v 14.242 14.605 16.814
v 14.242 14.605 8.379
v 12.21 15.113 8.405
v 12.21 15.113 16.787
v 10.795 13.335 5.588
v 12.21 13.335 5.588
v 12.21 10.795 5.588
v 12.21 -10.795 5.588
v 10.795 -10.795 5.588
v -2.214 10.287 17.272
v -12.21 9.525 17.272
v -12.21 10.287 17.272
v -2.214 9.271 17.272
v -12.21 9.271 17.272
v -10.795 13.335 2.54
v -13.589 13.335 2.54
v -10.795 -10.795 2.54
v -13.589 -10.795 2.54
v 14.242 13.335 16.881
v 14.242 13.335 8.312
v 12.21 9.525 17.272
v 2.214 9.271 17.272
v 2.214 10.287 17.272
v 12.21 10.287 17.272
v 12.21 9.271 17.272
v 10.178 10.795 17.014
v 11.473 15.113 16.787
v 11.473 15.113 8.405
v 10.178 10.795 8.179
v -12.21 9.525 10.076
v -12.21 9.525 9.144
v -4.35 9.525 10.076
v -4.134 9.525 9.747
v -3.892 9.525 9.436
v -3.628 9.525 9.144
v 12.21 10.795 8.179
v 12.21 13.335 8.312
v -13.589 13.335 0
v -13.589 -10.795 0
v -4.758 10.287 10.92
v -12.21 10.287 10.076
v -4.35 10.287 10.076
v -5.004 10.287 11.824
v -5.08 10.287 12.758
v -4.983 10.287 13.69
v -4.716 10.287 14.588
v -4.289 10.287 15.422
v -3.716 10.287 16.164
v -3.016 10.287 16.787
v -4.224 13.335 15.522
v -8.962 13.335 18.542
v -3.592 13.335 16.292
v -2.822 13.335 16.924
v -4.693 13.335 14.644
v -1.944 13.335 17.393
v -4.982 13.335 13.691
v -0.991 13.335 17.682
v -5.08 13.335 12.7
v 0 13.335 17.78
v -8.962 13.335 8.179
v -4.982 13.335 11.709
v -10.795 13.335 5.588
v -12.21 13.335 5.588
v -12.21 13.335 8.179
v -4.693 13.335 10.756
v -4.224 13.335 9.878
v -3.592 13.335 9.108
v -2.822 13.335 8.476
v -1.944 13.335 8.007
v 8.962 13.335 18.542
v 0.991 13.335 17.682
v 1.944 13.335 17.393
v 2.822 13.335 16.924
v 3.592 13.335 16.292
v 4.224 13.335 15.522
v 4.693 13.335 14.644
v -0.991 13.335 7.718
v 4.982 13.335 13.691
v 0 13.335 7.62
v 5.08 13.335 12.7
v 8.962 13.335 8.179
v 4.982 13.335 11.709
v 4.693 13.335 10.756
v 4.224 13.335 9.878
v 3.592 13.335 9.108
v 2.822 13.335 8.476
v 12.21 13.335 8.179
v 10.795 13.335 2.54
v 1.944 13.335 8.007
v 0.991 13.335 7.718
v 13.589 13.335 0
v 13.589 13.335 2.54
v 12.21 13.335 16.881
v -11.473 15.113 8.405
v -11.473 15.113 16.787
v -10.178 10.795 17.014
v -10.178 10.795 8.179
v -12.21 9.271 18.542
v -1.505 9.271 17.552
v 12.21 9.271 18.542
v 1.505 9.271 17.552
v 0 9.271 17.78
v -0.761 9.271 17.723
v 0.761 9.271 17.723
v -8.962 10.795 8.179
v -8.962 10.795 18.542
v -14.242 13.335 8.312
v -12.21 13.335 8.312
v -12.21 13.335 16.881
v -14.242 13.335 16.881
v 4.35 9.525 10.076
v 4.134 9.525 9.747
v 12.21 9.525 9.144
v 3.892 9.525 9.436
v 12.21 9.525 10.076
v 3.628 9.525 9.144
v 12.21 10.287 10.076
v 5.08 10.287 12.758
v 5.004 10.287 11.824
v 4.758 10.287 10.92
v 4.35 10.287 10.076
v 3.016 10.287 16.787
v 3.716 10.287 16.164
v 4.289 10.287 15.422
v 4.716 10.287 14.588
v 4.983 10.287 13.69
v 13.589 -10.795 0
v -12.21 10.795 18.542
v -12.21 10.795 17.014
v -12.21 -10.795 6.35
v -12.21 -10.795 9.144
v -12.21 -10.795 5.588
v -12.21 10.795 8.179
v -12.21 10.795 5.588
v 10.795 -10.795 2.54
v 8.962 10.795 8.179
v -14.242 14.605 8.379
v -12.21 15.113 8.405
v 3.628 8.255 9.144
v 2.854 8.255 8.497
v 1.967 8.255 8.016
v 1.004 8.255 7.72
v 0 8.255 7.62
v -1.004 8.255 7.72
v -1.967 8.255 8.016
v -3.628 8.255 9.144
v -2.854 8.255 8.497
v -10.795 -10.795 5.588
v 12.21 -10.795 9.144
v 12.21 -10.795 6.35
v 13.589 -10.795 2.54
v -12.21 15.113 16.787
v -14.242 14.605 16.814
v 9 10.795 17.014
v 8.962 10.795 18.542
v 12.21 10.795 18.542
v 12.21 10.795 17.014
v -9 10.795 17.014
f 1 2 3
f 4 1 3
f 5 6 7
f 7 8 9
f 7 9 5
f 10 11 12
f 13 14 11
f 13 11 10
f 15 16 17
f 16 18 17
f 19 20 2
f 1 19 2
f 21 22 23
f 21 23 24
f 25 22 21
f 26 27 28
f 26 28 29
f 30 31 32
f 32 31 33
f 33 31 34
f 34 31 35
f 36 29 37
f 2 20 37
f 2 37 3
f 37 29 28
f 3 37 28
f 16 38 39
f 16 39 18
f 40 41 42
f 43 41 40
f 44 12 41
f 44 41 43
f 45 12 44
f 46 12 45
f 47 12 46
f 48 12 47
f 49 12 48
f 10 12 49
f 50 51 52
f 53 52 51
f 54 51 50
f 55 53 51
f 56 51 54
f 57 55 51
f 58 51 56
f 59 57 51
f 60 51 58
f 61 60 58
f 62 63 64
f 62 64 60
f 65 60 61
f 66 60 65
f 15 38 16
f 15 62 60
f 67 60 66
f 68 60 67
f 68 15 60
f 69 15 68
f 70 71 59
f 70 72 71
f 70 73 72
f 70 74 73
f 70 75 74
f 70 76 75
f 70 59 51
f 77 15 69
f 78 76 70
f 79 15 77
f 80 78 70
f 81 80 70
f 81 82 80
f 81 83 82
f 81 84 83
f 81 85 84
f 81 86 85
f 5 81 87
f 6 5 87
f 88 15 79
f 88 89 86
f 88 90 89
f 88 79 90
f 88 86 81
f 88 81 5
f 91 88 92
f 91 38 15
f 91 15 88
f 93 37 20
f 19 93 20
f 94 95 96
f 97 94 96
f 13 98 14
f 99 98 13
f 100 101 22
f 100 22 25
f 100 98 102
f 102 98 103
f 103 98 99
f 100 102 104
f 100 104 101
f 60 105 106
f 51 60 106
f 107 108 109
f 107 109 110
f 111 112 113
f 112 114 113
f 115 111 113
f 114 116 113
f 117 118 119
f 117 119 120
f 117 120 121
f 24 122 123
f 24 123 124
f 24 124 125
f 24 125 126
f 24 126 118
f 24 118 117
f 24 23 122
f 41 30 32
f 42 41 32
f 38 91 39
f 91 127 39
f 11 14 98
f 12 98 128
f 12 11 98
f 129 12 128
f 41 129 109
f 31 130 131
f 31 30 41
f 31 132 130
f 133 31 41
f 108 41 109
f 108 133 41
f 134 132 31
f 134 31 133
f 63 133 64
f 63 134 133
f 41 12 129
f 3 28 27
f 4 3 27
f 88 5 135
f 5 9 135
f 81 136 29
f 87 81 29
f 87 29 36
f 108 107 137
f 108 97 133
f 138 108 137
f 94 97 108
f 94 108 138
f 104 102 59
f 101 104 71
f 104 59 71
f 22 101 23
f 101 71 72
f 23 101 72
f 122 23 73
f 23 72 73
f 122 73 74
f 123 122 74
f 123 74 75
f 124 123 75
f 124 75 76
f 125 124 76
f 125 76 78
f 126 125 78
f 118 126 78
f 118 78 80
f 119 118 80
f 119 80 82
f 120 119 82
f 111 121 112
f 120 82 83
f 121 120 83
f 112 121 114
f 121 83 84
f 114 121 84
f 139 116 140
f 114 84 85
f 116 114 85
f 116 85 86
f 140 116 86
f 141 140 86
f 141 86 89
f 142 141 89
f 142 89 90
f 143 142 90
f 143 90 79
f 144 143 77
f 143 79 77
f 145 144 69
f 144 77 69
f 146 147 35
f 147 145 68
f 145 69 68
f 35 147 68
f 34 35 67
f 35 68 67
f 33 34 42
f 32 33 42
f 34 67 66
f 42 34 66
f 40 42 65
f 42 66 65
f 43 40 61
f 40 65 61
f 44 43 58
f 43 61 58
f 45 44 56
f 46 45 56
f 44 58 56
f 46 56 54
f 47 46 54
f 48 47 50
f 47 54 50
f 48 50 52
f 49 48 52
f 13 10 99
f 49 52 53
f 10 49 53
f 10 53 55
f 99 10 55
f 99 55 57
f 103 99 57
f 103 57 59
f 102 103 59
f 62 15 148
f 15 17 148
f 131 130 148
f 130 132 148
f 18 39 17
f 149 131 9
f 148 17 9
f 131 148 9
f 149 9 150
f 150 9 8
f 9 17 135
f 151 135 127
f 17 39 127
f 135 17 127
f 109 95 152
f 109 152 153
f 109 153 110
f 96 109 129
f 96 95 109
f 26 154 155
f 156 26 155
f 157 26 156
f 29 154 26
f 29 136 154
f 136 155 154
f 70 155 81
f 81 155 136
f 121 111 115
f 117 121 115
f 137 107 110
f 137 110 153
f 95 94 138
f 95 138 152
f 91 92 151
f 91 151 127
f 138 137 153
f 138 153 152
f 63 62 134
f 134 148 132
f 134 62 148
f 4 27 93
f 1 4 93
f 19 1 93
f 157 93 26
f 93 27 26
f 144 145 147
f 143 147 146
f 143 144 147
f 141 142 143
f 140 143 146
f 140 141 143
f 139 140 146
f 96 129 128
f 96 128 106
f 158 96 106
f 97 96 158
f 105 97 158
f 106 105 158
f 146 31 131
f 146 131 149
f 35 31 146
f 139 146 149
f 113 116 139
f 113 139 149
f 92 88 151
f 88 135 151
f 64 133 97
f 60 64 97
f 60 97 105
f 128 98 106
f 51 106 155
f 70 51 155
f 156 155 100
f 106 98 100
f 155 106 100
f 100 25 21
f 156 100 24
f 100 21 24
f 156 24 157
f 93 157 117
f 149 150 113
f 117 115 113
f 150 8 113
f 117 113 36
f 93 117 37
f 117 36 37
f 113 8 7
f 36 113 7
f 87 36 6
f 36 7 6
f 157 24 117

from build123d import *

# Parameters (mm, degrees)
SKETCH2_W                       = 27.178
SKETCH2_H                       = 21.59
INITIAL_EXTRUDE_DEPTH           = 6.35
SKETCH3_W                       = 27.178
SKETCH3_H                       = 1.27
INTIAL_EXTRUDE_HORIZONTAL_DEPTH = 12.192
SKETCH4_W                       = 27.178
SKETCH4_H                       = 1.27
SLIGHT_EXTRUDE_VERTICAL_DEPTH   = 0.254
SKETCH5_W                       = 3.048
SKETCH5_H                       = 21.59
CUT_EXTRUDE1_DEPTH              = 2.794
CUT_EXTRUDE2_REACH              = 33.537
SKETCH6_W                       = 1.379153921
SKETCH6_H                       = 12.954
SNAP_START                      = 11.473246079
SNAP_HOOK2_DEPTH                = 0.7366
SNAP_START_2                    = 8.31223189
SNAP_HOOK2_2_DEPTH              = 8.568362063
SNAP_START_3                    = 8.179116131
SNAP_HOOK2_3_DEPTH              = 8.834593581
SNAP_START_4                    = 9
SNAP_HOOK2_4_DEPTH              = 6
BOSS_EXTRUDE1_DEPTH             = 2.54
SKETCH8_W                       = 24.419692158
SKETCH8_H                       = 7.195933706
CUT_EXTRUDE3_DEPTH              = 0.762
SKETCH9_W                       = 24.419692158
SKETCH9_H                       = 20.32
BOSS_EXTRUDE2_DEPTH             = 2.794
SKETCH10_R                      = 5.08
CUT_EXTRUDE4_DEPTH              = 5.08


with BuildPart() as part:
    # Sketch2 → Initial Extrude (new body)
    with BuildSketch(Plane.XY):
        Rectangle(SKETCH2_W, SKETCH2_H)
    extrude(amount=INITIAL_EXTRUDE_DEPTH)

    # Sketch3 → Intial Extrude horizontal (add)
    with BuildSketch(Plane.XY.offset(6.35)):
        with Locations((0, 10.16)):
            Rectangle(SKETCH3_W, SKETCH3_H)
    extrude(amount=INTIAL_EXTRUDE_HORIZONTAL_DEPTH)

    # Sketch4 → Slight Extrude vertical (add)
    with BuildSketch(Plane.XZ.offset(-9.525)):
        with Locations((0, 17.907)):
            Rectangle(SKETCH4_W, SKETCH4_H)
    extrude(amount=SLIGHT_EXTRUDE_VERTICAL_DEPTH)

    # Sketch5 → Cut-Extrude1 (cut)
    with BuildSketch(Plane.ZY.offset(13.589)):
        with Locations((4.064, 0)):
            Rectangle(SKETCH5_W, SKETCH5_H)
    cut_extrude1 = extrude(amount=-CUT_EXTRUDE1_DEPTH, mode=Mode.SUBTRACT)

    # Mirror3: Cut-Extrude1 across plane
    add(cut_extrude1.mirror(Plane(origin=(0, 0, 0), x_dir=(0, 0, 1), z_dir=(1, 0, 0))), mode=Mode.SUBTRACT)

    # Sketch6 → Cut-Extrude2 (cut, up to next)
    with BuildSketch(Plane(origin=(0, 10.795, 0), x_dir=(1, 0, 0), z_dir=(0, 1, 0)), mode=Mode.PRIVATE) as cut_extrude2_sk1:
        with Locations((12.89942304, -12.065)):
            Rectangle(SKETCH6_W, SKETCH6_H)
    cut_extrude2_tool1 = extrude(cut_extrude2_sk1.sketch, amount=-CUT_EXTRUDE2_REACH, mode=Mode.PRIVATE) & part.part
    cut_extrude2 = cut_extrude2_tool1.solids().sort_by_distance((12.899423, 10.795, 12.065))[0]
    add(cut_extrude2, mode=Mode.SUBTRACT)

    # Mirror7: Cut-Extrude2 across plane
    add(cut_extrude2.mirror(Plane(origin=(0, 0, 0), x_dir=(0, 0, 1), z_dir=(1, 0, 0))), mode=Mode.SUBTRACT)

    # Snap Hook2: read off the stored shape, not the designer's step
    # Snap Hook2 outline → Snap Hook2 (add)
    with BuildSketch(Plane.YZ.offset(SNAP_START)):
        Polygon((10.795, 17.013709712), (10.795, 8.179116131), (15.113, 8.405412922), (15.113, 16.787412922), align=None)
    snap_hook2 = extrude(amount=SNAP_HOOK2_DEPTH)

    # Snap Hook2 2 outline → Snap Hook2 2 (add)
    with BuildSketch(Plane.XY.offset(SNAP_START_2)):
        Polygon((11.473246079, 10.795), (11.473246079, 15.113), (10.177846079, 10.795), align=None)
        Polygon((12.209846079, 15.113), (12.209846079, 13.335), (14.241846079, 13.335), (14.241846079, 14.605), align=None)
    snap_hook2_2 = extrude(amount=SNAP_HOOK2_2_DEPTH)

    # Snap Hook2 3 outline → Snap Hook2 3 (add)
    with BuildSketch(Plane.XY.offset(SNAP_START_3)):
        Polygon((11.473246079, 10.795), (11.473246079, 15.113), (10.177846079, 10.795), align=None)
    snap_hook2_3 = extrude(amount=SNAP_HOOK2_3_DEPTH)

    # Snap Hook2 4 outline → Snap Hook2 4 (cut)
    with BuildSketch(Plane.YZ.offset(SNAP_START_4)):
        Polygon((10.795, 8.179116131), (17, 8.179116131), (17, 8.504306402), (15.113, 8.405412922), align=None)
        Polygon((15.113, 16.787412922), (17, 16.688519443), (17, 17.013709712), (10.795, 17.013709712), align=None)
    snap_hook2_4 = extrude(amount=SNAP_HOOK2_4_DEPTH, mode=Mode.SUBTRACT)

    # Mirror6: Snap Hook2, Snap Hook2 2, Snap Hook2 3, Snap Hook2 4 across plane
    add(snap_hook2.mirror(Plane(origin=(0, 0, 0), x_dir=(0, 0, 1), z_dir=(1, 0, 0))))
    add(snap_hook2_2.mirror(Plane(origin=(0, 0, 0), x_dir=(0, 0, 1), z_dir=(1, 0, 0))))
    add(snap_hook2_3.mirror(Plane(origin=(0, 0, 0), x_dir=(0, 0, 1), z_dir=(1, 0, 0))))
    add(snap_hook2_4.mirror(Plane(origin=(0, 0, 0), x_dir=(0, 0, 1), z_dir=(1, 0, 0))), mode=Mode.SUBTRACT)

    # Sketch7 → Boss-Extrude1 (add)
    with BuildSketch(Plane(origin=(0, 10.795, 0), x_dir=(1, 0, 0), z_dir=(0, 1, 0))):
        Polygon((-8.962447439, -8.179116131), (-8.962447439, -18.542), (8.962447439, -18.542), (8.962447439, -8.179116131), (9, -8.179116131), (10.177846079, -8.179116131), (12.209846079, -8.179116131), (12.209846079, -5.588), (10.795, -5.588), (10.795, -2.54), (13.589, -2.54), (13.589, 0), (-13.589, 0), (-13.589, -2.54), (-10.795, -2.54), (-10.795, -5.588), (-12.209846079, -5.588), (-12.209846079, -8.179116131), (-10.177846079, -8.179116131), (-9, -8.179116131), align=None)
    extrude(amount=BOSS_EXTRUDE1_DEPTH)

    # Sketch8 → Cut-Extrude3 (cut)
    with BuildSketch(Plane.XZ.offset(-9.525)):
        with Locations((0, 13.674033147)):
            Rectangle(SKETCH8_W, SKETCH8_H)
    extrude(amount=-CUT_EXTRUDE3_DEPTH, mode=Mode.SUBTRACT)

    # Sketch9 → Boss-Extrude2 (add)
    with BuildSketch(Plane.XY.offset(6.35)):
        with Locations((0, -0.635)):
            Rectangle(SKETCH9_W, SKETCH9_H)
    extrude(amount=BOSS_EXTRUDE2_DEPTH)

    # Sketch10 → Cut-Extrude4 (cut)
    with BuildSketch(Plane(origin=(0, 13.335, 0), x_dir=(1, 0, 0), z_dir=(0, 1, 0))):
        with Locations(Location((0, -12.7, 0), (0, 0, 270))):
            Circle(SKETCH10_R)
    extrude(amount=-CUT_EXTRUDE4_DEPTH, mode=Mode.SUBTRACT)


solid = part.part
